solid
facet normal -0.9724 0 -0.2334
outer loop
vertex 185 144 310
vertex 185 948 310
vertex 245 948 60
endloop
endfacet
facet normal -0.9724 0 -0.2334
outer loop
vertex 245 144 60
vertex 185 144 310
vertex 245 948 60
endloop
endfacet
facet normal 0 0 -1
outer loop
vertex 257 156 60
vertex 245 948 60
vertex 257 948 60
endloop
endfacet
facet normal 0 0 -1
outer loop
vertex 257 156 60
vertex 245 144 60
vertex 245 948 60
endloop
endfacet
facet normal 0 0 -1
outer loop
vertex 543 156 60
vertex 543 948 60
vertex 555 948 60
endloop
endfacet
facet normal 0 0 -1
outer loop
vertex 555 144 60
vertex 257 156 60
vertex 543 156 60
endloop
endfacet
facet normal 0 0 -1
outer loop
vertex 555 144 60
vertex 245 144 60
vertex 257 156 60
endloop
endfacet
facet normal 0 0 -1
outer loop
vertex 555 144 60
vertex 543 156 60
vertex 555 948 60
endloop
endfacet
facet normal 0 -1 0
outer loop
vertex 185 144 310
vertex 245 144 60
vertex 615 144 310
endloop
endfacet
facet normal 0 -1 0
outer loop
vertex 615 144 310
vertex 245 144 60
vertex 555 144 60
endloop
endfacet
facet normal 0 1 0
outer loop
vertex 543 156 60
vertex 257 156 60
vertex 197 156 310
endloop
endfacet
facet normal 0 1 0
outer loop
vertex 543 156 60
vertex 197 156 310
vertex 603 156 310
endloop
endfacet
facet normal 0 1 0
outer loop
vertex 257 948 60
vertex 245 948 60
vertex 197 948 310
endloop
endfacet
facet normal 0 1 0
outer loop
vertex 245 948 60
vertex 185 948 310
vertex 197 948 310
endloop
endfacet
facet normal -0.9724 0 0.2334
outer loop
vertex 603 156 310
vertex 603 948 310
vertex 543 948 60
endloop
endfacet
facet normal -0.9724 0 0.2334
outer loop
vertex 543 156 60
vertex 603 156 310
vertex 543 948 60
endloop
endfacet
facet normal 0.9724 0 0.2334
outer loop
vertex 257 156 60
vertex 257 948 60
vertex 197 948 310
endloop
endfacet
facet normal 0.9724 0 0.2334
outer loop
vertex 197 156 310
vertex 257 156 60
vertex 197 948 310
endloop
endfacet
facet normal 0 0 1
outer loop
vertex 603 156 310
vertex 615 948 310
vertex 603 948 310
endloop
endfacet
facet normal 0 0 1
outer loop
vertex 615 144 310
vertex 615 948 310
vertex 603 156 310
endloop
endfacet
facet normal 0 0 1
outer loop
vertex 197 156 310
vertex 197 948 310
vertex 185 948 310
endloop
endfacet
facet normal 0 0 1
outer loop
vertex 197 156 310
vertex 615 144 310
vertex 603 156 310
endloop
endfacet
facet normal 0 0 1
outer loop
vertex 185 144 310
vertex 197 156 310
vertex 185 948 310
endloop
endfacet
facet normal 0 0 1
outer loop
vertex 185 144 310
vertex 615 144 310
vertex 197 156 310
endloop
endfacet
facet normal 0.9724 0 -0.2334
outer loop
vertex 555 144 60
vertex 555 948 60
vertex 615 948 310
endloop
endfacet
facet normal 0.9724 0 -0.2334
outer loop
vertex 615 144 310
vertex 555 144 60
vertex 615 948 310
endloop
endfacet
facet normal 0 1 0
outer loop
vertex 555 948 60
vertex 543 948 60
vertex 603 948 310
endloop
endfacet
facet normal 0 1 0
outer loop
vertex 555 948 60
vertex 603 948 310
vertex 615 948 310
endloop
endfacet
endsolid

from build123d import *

# Parameters (mm, degrees)
BOX016_W        = 430
BOX016_H        = 12
BOX016_DEPTH    = 250
POCKET012_DEPTH = 12
PAD_DEPTH       = 792


with BuildPart() as part:
    # Box016 → Box016 (new body)
    with BuildSketch(Plane(origin=(185, 144, 60), x_dir=(1, 0, 0), z_dir=(0, 0, 1))):
        with Locations((215, 6)):
            Rectangle(BOX016_W, BOX016_H)
    extrude(amount=BOX016_DEPTH)

    # Sketch012 → Pocket012 (cut)
    with BuildSketch(Plane(origin=(185, 144, 60), x_dir=(1, 0, 0), z_dir=(0, -1, 0))):
        Polygon((0, 250), (0, 0), (60, 0), align=None)
        Polygon((430, 250), (430, 0), (370, 0), align=None)
    extrude(amount=-POCKET012_DEPTH, mode=Mode.SUBTRACT)

    # Sketch019 → Pad (new body)
    with BuildSketch(Plane(origin=(185, 156, 60), x_dir=(-1, 0, 0), z_dir=(0, 1, 0))):
        Polygon((-60, 0), (-72, 0), (-12, 250), (0, 250), align=None)
        Polygon((-370, 0), (-430, 250), (-418, 250), (-358, 0), align=None)
    extrude(amount=PAD_DEPTH)


solid = part.part
